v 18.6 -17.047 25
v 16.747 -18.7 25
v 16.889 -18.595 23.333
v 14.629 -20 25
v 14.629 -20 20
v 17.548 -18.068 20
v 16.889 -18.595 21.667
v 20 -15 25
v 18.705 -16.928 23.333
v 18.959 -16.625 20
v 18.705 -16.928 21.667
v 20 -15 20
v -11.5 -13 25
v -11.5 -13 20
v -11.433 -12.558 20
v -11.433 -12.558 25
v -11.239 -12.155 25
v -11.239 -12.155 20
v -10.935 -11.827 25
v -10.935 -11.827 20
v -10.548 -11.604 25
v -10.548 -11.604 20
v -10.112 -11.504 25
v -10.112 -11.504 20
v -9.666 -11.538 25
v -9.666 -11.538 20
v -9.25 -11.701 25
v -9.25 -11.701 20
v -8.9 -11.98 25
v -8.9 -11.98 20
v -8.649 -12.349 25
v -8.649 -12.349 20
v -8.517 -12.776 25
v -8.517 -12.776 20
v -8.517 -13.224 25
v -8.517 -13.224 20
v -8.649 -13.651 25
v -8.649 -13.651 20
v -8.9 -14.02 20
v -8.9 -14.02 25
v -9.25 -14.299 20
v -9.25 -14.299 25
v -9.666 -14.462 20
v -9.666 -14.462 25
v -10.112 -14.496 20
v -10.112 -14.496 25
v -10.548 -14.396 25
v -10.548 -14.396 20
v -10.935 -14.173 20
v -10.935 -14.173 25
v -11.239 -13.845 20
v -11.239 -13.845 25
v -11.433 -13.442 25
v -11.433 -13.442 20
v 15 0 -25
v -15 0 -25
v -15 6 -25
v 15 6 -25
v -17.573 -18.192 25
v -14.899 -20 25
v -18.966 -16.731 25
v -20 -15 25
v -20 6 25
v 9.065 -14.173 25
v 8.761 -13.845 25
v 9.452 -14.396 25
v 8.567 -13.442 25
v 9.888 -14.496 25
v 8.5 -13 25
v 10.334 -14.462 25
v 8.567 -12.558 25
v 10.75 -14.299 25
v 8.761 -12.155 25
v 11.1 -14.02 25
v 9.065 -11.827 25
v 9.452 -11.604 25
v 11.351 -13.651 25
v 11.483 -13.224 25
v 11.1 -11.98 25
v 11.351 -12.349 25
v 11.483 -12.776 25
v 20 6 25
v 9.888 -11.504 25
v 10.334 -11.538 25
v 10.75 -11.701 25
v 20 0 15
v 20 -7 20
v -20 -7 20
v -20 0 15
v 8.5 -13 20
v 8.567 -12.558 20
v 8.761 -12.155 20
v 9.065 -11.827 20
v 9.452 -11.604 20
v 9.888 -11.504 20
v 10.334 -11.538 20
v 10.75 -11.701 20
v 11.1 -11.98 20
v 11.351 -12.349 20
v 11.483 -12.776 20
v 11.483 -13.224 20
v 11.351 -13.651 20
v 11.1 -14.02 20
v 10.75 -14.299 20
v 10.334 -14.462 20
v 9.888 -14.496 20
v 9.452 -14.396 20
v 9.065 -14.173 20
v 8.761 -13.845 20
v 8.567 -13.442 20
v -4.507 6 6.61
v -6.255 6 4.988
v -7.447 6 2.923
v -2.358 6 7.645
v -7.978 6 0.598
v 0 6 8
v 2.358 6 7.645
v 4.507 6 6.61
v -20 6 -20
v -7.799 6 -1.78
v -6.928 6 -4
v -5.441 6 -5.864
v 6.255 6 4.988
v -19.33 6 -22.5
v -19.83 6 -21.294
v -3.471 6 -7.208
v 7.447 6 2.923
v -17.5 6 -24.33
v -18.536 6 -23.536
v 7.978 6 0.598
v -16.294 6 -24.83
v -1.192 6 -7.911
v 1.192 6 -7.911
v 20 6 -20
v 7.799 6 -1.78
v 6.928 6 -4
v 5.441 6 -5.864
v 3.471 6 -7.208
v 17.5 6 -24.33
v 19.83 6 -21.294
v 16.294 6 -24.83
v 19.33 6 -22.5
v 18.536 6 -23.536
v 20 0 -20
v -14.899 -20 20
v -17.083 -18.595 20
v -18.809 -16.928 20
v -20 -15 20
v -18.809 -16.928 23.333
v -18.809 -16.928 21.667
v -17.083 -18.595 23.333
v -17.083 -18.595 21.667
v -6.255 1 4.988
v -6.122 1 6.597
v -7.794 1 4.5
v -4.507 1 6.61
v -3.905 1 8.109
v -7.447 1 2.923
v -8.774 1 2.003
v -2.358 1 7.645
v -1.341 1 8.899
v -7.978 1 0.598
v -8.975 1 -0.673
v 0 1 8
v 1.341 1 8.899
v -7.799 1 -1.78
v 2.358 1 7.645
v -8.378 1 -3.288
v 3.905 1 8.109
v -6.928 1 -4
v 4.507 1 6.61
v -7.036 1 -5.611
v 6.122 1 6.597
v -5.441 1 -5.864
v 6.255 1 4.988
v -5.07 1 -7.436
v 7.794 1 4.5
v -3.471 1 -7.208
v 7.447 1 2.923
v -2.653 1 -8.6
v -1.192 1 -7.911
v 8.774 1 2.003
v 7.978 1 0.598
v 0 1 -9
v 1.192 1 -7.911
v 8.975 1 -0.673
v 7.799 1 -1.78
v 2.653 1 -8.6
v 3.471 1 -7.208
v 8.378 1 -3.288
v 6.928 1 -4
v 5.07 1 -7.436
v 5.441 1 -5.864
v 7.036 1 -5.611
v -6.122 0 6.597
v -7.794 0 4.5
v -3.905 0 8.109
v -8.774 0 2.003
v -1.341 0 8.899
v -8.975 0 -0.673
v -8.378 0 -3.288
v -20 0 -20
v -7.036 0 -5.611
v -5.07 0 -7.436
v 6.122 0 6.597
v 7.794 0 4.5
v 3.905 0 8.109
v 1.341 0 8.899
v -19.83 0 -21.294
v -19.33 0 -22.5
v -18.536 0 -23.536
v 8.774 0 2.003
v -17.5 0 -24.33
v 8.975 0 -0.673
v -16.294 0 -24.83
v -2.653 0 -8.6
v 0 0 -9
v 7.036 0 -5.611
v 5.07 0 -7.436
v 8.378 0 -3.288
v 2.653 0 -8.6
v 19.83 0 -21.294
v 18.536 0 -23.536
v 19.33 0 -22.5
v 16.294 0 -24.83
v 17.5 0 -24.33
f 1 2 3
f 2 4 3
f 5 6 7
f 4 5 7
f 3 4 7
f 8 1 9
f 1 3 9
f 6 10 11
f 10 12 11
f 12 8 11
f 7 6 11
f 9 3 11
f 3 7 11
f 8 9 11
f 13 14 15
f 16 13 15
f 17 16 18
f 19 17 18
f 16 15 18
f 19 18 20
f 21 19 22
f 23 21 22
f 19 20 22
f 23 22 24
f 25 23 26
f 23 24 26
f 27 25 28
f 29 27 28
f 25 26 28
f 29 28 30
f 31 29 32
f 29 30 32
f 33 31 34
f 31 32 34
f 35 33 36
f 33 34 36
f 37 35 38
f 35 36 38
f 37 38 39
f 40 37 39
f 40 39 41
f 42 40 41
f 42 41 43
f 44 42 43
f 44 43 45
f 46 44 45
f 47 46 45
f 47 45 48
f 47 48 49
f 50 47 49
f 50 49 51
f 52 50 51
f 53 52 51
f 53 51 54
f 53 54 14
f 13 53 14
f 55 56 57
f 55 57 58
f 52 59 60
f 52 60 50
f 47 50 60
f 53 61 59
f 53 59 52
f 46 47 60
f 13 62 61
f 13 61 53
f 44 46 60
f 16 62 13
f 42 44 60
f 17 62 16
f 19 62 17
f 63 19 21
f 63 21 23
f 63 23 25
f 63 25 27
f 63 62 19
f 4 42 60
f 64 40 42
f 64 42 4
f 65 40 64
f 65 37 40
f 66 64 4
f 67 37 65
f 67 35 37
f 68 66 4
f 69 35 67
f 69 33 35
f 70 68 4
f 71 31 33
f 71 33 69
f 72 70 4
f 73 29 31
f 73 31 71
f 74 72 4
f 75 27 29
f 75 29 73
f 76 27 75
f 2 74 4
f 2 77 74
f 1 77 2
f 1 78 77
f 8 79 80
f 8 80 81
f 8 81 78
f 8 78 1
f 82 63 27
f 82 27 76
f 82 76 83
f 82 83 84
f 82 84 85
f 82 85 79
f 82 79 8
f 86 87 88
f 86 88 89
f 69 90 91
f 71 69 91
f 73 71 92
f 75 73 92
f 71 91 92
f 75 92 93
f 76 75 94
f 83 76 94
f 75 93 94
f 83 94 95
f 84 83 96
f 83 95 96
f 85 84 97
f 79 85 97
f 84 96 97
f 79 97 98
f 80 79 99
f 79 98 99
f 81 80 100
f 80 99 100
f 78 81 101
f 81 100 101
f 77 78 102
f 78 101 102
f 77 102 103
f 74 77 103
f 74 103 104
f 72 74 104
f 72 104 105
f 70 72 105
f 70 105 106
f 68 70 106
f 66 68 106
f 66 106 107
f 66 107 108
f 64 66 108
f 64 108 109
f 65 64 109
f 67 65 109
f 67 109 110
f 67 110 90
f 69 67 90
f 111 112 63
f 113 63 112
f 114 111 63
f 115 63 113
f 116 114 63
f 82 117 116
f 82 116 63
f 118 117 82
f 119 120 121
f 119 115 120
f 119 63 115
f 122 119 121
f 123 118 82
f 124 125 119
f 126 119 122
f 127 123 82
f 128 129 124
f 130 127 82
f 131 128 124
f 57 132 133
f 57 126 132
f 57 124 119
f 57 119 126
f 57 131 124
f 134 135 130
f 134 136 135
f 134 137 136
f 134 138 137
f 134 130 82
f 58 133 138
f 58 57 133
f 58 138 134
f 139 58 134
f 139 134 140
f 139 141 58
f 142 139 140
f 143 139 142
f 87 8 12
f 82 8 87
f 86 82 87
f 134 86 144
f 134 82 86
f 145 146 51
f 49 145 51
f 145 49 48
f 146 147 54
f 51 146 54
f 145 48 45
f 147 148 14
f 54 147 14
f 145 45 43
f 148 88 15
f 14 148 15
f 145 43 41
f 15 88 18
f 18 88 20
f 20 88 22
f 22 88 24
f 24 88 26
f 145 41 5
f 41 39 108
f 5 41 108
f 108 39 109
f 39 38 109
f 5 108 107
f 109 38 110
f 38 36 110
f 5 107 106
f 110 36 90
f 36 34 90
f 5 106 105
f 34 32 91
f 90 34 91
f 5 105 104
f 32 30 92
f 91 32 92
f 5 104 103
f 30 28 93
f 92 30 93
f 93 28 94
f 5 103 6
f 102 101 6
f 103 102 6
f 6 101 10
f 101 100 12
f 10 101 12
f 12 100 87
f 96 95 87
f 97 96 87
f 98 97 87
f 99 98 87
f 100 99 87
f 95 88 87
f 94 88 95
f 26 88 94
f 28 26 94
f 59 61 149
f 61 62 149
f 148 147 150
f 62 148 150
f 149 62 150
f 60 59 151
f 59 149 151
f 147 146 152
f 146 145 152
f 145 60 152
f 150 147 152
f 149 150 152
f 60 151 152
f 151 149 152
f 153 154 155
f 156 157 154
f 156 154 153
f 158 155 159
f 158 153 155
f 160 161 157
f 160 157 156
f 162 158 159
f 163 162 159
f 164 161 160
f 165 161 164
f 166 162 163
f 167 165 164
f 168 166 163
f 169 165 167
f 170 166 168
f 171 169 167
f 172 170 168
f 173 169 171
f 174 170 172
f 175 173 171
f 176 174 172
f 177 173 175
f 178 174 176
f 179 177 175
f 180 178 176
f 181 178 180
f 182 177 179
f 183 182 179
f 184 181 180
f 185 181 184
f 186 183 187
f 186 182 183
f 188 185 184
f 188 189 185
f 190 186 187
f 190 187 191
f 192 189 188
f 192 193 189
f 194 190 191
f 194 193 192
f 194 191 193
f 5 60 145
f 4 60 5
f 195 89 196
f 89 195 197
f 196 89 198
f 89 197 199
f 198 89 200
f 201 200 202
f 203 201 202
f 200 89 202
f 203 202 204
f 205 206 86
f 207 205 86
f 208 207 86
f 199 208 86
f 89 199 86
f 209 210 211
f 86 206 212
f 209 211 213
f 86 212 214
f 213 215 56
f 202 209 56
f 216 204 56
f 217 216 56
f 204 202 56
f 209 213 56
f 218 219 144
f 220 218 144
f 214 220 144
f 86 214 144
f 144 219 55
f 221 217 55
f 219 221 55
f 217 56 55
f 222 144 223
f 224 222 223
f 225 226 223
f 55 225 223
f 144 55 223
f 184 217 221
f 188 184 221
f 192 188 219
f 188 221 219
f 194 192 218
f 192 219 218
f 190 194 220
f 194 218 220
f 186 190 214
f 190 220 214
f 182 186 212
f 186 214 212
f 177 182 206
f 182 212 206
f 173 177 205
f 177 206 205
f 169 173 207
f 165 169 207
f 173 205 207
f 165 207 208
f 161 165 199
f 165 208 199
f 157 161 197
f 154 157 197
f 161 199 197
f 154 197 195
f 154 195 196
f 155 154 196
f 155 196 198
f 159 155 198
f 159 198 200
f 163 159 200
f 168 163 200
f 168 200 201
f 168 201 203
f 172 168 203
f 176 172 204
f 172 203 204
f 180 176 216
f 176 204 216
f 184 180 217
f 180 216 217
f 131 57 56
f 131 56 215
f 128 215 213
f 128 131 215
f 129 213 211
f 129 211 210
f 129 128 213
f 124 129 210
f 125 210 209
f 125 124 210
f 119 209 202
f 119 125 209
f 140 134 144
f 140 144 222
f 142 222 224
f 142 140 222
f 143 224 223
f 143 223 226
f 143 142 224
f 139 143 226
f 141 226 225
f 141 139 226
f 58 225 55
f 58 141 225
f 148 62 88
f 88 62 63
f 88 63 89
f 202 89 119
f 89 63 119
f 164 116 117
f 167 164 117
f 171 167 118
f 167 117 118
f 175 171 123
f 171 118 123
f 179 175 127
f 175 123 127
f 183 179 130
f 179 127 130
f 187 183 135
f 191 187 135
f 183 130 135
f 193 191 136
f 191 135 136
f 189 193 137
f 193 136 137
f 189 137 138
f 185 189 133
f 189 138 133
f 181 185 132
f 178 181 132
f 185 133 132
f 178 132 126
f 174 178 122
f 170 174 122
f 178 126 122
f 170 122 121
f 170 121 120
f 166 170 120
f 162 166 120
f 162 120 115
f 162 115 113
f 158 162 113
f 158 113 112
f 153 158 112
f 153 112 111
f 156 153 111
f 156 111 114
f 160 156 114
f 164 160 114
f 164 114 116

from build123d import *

# Parameters (mm, degrees)
SKETCH1_W           = 40
SKETCH1_H           = 50
BOSS_EXTRUDE1_DEPTH = 6
SKETCH3_R           = 8
CUT_EXTRUDE1_DEPTH  = 9
SKETCH4_W           = 40
SKETCH4_H           = 5
BOSS_EXTRUDE2_DEPTH = 20
BOSS_EXTRUDE3_DEPTH = 40
SKETCH6_R           = 1.5
CUT_EXTRUDE2_DEPTH  = 54.150729064
CUT_EXTRUDE3_DEPTH  = 42.243181255
CUT_EXTRUDE4_DEPTH  = 54.150729064
SKETCH9_R           = 9
CUT_EXTRUDE5_DEPTH  = 1


with BuildPart() as part:
    # Sketch1 → Boss-Extrude1 (new body)
    with BuildSketch(Plane(origin=(0, 0, 0), x_dir=(1, 0, 0), z_dir=(0, 1, 0))):
        Rectangle(SKETCH1_W, SKETCH1_H)
    extrude(amount=BOSS_EXTRUDE1_DEPTH)

    # Sketch3 → Cut-Extrude1 (cut)
    with BuildSketch(Plane(origin=(0, 6, 0), x_dir=(1, 0, 0), z_dir=(0, 1, 0))):
        with Locations(Location((0, 0, 0), (0, 0, 270))):
            Circle(SKETCH3_R)
    extrude(amount=-CUT_EXTRUDE1_DEPTH, mode=Mode.SUBTRACT)

    # Sketch4 → Boss-Extrude2 (add)
    with BuildSketch(Plane.XZ):
        with Locations((0, 22.5)):
            Rectangle(SKETCH4_W, SKETCH4_H)
    extrude(amount=BOSS_EXTRUDE2_DEPTH)

    # Sketch5 → Boss-Extrude3 (add)
    with BuildSketch(Plane(origin=(20, 0, 0), x_dir=(0, 0, -1), z_dir=(1, 0, 0))):
        Polygon((-15, 0), (-20, 0), (-20, -7), align=None)
    extrude(amount=-BOSS_EXTRUDE3_DEPTH)

    # Sketch6 → Cut-Extrude2 (cut, through all)
    with BuildSketch(Plane(origin=(0, 0, 20), x_dir=(-1, 0, 0), z_dir=(0, 0, -1))):
        with Locations((-10, -13)):
            Circle(SKETCH6_R)
        with Locations((10, -13)):
            Circle(SKETCH6_R)
    extrude(amount=-CUT_EXTRUDE2_DEPTH, mode=Mode.SUBTRACT)

    # Sketch7 → Cut-Extrude3 (cut, through all)
    with BuildSketch(Plane(origin=(0, 6, 0), x_dir=(1, 0, 0), z_dir=(0, 1, 0))):
        with BuildLine():
            Line((-20, 20), (-20, 25))
            Line((-20, 25), (-15, 25))
            ThreePointArc((-15, 25), (-18.535533906, 23.535533906), (-20, 20))
        make_face()
        with BuildLine():
            Line((15, 25), (20, 25))
            Line((20, 25), (20, 20))
            ThreePointArc((20, 20), (18.535533906, 23.535533906), (15, 25))
        make_face()
    extrude(amount=-CUT_EXTRUDE3_DEPTH, mode=Mode.SUBTRACT)

    # Sketch8 → Cut-Extrude4 (cut, through all)
    with BuildSketch(Plane(origin=(0, 0, 20), x_dir=(-1, 0, 0), z_dir=(0, 0, -1))):
        with BuildLine():
            Line((20, -20), (20, -15))
            add(Edge.make_bspline(
                [(20, -15), (19.102747752, -17.059066779), (17.286957895, -18.725733446), (14.898686187, -20)],
                knots=[0, 0, 0, 0, 0.190571824, 0.190571824, 0.190571824, 0.190571824], degree=3))
            Line((14.898686187, -20), (20, -20))
        make_face()
        with BuildLine():
            Line((-20, -20), (-14.628627564, -20))
            add(Edge.make_bspline(
                [(-14.628627564, -20), (-17.085724607, -18.725733446), (-18.991534004, -17.059066779), (-20, -15)],
                knots=[0.809428176, 0.809428176, 0.809428176, 0.809428176, 1, 1, 1, 1], degree=3))
            Line((-20, -15), (-20, -20))
        make_face()
    extrude(amount=-CUT_EXTRUDE4_DEPTH, mode=Mode.SUBTRACT)

    # Sketch9 → Cut-Extrude5 (cut)
    with BuildSketch(Plane.XZ):
        with Locations(Location((0, 0, 0), (0, 0, 270))):
            Circle(SKETCH9_R)
    extrude(amount=-CUT_EXTRUDE5_DEPTH, mode=Mode.SUBTRACT)


solid = part.part
